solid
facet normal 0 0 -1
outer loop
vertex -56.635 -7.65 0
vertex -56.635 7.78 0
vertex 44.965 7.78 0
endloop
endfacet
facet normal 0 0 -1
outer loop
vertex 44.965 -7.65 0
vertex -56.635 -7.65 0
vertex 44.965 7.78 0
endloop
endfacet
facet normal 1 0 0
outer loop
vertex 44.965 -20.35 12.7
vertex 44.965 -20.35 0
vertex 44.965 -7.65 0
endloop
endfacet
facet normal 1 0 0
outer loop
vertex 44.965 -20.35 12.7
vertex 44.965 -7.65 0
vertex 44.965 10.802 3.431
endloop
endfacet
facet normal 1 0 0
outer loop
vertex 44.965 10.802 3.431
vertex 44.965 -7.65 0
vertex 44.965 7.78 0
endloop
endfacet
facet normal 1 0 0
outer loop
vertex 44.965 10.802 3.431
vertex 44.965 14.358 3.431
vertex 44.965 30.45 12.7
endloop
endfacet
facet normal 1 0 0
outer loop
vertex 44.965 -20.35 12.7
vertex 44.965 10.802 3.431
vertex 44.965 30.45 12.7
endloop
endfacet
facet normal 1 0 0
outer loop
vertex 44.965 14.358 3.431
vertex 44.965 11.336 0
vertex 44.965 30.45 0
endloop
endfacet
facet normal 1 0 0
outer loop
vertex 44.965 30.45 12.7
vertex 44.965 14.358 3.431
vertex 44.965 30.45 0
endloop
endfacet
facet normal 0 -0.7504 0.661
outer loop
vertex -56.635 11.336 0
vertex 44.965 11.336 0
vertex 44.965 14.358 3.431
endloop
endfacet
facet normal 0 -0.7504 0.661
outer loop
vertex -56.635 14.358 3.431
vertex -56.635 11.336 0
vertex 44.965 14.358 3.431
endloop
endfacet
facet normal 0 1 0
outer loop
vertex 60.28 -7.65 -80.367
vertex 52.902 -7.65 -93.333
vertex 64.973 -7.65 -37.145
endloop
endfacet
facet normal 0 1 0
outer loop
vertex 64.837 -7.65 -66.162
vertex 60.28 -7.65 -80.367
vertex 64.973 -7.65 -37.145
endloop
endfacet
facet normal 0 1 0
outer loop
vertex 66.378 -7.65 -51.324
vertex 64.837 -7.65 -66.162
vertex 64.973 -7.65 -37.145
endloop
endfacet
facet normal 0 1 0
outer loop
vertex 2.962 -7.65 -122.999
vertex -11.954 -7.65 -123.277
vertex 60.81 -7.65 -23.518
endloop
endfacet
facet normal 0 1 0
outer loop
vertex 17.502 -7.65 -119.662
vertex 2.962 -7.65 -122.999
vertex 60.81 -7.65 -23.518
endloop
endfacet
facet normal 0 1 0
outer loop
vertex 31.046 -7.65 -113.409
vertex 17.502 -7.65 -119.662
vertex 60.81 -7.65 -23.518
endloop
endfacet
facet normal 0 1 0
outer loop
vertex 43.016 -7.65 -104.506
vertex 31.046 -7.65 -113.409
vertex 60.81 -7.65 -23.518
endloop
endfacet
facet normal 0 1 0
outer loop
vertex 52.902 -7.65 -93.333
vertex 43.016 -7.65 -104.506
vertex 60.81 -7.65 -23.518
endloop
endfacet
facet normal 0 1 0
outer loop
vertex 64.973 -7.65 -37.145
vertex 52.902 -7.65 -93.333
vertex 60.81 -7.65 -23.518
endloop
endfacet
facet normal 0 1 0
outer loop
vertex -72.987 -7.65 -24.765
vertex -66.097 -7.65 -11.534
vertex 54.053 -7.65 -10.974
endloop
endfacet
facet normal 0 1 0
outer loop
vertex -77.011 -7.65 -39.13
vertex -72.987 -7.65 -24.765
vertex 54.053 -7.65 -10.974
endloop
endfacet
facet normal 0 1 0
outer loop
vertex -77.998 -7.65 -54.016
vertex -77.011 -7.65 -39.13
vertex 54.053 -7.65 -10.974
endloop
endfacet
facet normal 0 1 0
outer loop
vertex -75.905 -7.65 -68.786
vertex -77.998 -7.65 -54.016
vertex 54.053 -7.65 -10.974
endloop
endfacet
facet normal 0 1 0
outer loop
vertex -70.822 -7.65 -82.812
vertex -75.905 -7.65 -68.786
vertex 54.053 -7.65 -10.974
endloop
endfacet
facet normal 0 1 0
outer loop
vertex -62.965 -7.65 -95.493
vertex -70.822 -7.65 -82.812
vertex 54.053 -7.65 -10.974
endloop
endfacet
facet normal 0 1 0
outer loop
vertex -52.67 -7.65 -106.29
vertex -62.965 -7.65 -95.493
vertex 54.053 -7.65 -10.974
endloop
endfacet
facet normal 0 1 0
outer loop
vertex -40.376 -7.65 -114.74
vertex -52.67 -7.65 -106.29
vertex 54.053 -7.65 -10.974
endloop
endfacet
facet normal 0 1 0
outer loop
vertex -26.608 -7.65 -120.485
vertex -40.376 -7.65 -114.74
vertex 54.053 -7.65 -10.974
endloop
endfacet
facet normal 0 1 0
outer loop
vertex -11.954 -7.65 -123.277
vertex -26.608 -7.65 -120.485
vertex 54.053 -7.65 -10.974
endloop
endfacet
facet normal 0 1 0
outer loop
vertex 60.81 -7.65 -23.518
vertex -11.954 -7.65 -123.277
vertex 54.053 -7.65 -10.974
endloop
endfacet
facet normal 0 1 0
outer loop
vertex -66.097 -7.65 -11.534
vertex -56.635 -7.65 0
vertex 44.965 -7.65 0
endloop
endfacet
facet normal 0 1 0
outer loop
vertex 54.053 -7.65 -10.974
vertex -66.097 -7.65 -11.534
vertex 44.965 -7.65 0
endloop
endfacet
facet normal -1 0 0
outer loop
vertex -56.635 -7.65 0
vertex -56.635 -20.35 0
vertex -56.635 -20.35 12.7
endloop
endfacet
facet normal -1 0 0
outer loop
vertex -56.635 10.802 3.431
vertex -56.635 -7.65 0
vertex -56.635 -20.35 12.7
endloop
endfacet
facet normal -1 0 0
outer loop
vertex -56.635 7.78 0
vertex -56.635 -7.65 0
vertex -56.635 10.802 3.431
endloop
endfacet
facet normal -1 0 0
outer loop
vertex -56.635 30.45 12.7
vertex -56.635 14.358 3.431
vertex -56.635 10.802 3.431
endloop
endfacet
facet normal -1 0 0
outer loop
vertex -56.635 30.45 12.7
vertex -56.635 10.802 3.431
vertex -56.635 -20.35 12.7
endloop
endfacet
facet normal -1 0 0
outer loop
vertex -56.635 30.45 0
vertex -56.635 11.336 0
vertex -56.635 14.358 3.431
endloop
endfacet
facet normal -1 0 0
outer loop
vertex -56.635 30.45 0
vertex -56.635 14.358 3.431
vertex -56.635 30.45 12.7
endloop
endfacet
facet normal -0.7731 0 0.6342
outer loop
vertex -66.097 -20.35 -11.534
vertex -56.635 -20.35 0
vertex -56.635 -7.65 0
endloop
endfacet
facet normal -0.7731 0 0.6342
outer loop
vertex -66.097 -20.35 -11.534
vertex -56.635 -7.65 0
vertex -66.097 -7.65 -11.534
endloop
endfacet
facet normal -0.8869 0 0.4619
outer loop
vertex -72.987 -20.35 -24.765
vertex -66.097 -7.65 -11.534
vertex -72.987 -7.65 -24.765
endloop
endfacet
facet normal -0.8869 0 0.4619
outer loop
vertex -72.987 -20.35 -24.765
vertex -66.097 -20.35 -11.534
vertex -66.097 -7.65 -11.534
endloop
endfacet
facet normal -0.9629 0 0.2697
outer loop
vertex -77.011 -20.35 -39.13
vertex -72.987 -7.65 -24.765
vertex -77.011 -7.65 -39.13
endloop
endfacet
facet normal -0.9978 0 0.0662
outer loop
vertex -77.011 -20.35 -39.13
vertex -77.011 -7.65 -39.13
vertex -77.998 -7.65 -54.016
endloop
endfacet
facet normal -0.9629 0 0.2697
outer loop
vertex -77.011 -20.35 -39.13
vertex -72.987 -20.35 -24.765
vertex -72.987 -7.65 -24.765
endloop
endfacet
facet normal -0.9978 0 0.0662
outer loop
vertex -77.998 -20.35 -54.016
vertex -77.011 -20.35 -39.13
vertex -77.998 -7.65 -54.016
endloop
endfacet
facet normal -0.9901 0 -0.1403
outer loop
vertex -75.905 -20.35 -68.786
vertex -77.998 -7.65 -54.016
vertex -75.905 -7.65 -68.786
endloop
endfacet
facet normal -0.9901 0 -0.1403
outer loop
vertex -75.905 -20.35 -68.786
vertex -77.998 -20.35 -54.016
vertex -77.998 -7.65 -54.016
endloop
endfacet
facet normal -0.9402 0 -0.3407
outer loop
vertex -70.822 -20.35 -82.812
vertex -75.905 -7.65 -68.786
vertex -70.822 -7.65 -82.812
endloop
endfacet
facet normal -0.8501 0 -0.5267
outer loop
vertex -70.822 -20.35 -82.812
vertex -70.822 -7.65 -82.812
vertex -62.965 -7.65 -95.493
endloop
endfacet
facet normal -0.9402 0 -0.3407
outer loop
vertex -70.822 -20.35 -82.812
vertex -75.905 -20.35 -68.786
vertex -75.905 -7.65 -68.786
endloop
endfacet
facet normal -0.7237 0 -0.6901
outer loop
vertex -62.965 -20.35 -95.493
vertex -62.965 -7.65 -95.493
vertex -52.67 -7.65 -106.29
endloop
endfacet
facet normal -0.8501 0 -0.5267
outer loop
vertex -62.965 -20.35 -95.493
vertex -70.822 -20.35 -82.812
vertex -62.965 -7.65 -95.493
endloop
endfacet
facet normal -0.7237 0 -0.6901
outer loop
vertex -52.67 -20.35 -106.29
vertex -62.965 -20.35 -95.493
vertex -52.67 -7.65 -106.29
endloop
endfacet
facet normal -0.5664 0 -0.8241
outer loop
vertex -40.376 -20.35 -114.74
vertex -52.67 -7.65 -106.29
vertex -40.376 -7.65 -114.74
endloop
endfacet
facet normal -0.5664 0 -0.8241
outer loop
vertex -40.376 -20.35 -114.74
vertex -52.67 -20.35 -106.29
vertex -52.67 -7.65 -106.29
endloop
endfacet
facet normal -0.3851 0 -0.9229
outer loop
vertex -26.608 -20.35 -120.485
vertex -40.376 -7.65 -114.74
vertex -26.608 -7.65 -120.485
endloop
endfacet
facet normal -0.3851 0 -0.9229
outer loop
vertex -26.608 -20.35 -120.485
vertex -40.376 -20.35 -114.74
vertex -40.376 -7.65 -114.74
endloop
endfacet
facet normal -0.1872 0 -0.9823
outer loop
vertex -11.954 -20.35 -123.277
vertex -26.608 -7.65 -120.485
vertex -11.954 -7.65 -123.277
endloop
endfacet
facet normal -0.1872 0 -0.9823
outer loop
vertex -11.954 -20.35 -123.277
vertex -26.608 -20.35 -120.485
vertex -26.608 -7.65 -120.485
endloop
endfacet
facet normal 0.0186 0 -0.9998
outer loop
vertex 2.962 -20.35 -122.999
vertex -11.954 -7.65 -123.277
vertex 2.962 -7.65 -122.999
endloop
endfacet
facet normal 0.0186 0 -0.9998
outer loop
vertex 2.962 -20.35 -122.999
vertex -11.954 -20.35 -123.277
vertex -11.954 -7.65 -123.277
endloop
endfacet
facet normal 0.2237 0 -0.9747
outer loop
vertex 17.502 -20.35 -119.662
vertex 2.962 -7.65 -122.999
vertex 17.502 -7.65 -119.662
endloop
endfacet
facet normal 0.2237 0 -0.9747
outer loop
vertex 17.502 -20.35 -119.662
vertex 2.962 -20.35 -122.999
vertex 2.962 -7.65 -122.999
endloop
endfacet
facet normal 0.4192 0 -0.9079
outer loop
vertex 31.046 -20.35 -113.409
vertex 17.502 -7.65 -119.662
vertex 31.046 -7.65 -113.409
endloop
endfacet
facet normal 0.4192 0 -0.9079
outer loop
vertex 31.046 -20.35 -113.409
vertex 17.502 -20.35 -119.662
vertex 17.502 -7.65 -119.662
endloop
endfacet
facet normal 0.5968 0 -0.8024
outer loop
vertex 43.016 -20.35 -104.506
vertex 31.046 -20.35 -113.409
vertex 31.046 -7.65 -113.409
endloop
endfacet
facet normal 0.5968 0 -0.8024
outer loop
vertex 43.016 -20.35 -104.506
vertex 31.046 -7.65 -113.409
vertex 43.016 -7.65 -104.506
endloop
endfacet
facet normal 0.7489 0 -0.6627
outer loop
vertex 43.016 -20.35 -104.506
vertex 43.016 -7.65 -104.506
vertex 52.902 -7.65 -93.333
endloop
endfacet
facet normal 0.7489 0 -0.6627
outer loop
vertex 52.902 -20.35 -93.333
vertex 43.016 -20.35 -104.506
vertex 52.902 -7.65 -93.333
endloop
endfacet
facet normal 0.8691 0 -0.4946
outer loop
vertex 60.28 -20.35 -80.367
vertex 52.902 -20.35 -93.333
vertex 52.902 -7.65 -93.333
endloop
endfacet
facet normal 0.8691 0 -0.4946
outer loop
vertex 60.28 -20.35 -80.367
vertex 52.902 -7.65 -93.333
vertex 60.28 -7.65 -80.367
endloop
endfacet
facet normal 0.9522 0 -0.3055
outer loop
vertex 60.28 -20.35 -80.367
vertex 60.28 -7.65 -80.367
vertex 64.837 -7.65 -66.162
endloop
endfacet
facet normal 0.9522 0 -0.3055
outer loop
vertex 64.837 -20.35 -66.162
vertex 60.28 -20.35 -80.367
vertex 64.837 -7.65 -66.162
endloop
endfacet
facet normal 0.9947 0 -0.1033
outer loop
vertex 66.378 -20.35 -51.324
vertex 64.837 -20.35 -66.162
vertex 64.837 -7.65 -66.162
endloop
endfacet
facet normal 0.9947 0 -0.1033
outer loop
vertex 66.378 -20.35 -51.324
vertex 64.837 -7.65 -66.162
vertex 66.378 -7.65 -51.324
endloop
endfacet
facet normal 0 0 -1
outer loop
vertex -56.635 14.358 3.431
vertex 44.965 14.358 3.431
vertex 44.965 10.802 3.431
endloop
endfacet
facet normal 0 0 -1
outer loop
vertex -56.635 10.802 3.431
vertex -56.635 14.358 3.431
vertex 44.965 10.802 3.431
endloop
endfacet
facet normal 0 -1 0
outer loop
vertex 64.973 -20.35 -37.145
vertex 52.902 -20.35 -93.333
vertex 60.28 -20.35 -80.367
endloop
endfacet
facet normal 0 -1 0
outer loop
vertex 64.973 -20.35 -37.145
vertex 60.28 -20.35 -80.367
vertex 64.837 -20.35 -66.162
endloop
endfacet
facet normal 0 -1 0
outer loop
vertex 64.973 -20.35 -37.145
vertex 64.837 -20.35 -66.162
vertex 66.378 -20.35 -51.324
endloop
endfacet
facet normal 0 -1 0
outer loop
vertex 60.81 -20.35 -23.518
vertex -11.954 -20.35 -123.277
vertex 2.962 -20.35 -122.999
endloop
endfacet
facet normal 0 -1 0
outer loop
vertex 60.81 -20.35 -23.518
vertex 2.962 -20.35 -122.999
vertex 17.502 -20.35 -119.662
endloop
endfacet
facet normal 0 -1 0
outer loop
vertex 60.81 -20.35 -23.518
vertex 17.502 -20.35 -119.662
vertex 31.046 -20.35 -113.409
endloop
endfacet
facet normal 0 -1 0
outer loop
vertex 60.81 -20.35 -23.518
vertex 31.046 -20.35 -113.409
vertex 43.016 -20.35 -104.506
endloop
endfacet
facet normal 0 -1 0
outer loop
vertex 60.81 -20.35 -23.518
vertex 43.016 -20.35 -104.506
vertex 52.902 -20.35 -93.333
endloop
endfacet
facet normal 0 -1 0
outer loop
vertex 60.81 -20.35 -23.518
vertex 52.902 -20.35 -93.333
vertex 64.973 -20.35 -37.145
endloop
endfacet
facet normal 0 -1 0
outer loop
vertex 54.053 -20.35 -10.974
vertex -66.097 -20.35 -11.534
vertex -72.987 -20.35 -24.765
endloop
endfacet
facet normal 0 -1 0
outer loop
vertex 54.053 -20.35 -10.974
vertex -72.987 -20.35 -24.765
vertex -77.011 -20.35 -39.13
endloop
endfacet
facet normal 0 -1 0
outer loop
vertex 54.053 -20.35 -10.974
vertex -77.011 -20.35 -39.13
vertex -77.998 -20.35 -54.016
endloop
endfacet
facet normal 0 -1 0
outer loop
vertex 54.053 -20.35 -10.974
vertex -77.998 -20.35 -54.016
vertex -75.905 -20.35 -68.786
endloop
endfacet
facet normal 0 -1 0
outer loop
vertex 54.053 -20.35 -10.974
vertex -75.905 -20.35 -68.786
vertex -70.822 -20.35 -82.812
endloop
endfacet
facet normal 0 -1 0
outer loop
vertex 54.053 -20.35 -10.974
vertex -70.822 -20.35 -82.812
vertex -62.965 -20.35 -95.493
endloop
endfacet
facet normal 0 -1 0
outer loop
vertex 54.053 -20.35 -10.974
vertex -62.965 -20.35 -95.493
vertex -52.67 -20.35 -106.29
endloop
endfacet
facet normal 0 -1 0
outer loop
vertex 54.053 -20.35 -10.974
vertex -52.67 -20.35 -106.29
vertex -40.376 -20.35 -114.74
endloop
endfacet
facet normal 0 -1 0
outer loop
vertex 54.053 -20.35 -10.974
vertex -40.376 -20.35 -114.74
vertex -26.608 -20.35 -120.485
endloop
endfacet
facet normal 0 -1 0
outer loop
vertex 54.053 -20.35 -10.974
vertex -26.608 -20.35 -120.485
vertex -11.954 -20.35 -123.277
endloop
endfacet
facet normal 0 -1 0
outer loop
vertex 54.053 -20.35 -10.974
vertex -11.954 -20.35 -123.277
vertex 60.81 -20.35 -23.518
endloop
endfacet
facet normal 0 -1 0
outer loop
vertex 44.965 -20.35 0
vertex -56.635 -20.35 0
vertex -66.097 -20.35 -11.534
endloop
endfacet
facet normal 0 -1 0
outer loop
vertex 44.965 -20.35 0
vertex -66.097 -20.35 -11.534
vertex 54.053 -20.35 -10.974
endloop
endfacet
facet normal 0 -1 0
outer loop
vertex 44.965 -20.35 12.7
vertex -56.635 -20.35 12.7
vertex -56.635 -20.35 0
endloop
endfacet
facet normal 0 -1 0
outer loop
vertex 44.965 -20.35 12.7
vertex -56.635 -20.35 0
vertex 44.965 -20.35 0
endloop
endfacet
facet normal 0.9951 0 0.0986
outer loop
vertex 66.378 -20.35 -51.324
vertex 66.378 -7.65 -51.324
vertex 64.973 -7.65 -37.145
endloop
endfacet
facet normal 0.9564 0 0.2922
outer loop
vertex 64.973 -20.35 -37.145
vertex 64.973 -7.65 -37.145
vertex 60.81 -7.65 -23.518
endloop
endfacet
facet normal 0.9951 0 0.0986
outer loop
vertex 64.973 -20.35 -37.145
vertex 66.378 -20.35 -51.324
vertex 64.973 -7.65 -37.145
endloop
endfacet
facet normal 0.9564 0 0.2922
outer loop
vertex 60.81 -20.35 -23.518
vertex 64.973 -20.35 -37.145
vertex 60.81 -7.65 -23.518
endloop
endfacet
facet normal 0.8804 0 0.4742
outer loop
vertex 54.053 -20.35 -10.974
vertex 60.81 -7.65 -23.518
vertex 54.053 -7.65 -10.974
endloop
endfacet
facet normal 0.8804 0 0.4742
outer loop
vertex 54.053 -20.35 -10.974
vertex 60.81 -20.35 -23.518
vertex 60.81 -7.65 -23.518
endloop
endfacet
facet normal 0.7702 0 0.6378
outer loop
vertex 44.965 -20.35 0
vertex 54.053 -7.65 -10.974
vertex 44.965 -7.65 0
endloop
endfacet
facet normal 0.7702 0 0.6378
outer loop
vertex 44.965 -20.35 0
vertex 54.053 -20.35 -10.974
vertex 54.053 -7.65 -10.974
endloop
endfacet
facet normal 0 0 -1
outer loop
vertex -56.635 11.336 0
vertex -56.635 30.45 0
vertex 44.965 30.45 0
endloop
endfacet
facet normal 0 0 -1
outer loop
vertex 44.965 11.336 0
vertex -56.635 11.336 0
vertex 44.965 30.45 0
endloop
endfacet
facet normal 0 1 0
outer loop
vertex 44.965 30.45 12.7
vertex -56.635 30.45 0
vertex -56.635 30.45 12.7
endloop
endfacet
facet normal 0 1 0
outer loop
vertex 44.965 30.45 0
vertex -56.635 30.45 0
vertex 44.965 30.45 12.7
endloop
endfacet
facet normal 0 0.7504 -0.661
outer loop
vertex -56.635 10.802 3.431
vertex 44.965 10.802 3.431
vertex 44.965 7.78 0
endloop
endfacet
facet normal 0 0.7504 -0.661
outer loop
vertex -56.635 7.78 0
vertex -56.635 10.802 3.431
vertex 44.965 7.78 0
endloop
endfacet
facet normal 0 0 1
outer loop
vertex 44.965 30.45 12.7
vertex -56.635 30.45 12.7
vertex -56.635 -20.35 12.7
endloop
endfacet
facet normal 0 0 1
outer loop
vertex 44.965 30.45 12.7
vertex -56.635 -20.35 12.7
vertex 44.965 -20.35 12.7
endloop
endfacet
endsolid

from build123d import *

# Parameters (mm, degrees)
F0_W     = 101.6
F0_H     = 50.8
F1_DEPTH = 12.7
F3_DEPTH = 101.6
F5_DEPTH = 12.7


with BuildPart() as f1:
    # F0 (on Top) → F1 (new body)
    with BuildSketch(Plane.XY):
        with Locations((-5.834938, 5.050136)):
            Rectangle(F0_W, F0_H)
    extrude(amount=F1_DEPTH)

    # F2 (on face) → F3 (cut)
    with BuildSketch(Plane.YZ.offset(44.965062)):
        Polygon((7.780036, 0), (11.336036, 0), (14.358213, 3.43069), (10.802213, 3.43069), align=None)
    extrude(amount=-F3_DEPTH, mode=Mode.SUBTRACT)

    # F4 (on face) → F5 (join)
    with BuildSketch(Plane.XZ.offset(20.349864)):
        with BuildLine():
            ThreePointArc((-56.634938, 0), (-33.640743, -117.969016), (66.378369, -51.323695))
            ThreePointArc((66.378369, -51.323695), (60.810383, -23.517889), (44.965062, 0))
            Line((44.965062, 0), (-56.634938, 0))
        make_face()
    extrude(amount=-F5_DEPTH)


solid = f1.part
